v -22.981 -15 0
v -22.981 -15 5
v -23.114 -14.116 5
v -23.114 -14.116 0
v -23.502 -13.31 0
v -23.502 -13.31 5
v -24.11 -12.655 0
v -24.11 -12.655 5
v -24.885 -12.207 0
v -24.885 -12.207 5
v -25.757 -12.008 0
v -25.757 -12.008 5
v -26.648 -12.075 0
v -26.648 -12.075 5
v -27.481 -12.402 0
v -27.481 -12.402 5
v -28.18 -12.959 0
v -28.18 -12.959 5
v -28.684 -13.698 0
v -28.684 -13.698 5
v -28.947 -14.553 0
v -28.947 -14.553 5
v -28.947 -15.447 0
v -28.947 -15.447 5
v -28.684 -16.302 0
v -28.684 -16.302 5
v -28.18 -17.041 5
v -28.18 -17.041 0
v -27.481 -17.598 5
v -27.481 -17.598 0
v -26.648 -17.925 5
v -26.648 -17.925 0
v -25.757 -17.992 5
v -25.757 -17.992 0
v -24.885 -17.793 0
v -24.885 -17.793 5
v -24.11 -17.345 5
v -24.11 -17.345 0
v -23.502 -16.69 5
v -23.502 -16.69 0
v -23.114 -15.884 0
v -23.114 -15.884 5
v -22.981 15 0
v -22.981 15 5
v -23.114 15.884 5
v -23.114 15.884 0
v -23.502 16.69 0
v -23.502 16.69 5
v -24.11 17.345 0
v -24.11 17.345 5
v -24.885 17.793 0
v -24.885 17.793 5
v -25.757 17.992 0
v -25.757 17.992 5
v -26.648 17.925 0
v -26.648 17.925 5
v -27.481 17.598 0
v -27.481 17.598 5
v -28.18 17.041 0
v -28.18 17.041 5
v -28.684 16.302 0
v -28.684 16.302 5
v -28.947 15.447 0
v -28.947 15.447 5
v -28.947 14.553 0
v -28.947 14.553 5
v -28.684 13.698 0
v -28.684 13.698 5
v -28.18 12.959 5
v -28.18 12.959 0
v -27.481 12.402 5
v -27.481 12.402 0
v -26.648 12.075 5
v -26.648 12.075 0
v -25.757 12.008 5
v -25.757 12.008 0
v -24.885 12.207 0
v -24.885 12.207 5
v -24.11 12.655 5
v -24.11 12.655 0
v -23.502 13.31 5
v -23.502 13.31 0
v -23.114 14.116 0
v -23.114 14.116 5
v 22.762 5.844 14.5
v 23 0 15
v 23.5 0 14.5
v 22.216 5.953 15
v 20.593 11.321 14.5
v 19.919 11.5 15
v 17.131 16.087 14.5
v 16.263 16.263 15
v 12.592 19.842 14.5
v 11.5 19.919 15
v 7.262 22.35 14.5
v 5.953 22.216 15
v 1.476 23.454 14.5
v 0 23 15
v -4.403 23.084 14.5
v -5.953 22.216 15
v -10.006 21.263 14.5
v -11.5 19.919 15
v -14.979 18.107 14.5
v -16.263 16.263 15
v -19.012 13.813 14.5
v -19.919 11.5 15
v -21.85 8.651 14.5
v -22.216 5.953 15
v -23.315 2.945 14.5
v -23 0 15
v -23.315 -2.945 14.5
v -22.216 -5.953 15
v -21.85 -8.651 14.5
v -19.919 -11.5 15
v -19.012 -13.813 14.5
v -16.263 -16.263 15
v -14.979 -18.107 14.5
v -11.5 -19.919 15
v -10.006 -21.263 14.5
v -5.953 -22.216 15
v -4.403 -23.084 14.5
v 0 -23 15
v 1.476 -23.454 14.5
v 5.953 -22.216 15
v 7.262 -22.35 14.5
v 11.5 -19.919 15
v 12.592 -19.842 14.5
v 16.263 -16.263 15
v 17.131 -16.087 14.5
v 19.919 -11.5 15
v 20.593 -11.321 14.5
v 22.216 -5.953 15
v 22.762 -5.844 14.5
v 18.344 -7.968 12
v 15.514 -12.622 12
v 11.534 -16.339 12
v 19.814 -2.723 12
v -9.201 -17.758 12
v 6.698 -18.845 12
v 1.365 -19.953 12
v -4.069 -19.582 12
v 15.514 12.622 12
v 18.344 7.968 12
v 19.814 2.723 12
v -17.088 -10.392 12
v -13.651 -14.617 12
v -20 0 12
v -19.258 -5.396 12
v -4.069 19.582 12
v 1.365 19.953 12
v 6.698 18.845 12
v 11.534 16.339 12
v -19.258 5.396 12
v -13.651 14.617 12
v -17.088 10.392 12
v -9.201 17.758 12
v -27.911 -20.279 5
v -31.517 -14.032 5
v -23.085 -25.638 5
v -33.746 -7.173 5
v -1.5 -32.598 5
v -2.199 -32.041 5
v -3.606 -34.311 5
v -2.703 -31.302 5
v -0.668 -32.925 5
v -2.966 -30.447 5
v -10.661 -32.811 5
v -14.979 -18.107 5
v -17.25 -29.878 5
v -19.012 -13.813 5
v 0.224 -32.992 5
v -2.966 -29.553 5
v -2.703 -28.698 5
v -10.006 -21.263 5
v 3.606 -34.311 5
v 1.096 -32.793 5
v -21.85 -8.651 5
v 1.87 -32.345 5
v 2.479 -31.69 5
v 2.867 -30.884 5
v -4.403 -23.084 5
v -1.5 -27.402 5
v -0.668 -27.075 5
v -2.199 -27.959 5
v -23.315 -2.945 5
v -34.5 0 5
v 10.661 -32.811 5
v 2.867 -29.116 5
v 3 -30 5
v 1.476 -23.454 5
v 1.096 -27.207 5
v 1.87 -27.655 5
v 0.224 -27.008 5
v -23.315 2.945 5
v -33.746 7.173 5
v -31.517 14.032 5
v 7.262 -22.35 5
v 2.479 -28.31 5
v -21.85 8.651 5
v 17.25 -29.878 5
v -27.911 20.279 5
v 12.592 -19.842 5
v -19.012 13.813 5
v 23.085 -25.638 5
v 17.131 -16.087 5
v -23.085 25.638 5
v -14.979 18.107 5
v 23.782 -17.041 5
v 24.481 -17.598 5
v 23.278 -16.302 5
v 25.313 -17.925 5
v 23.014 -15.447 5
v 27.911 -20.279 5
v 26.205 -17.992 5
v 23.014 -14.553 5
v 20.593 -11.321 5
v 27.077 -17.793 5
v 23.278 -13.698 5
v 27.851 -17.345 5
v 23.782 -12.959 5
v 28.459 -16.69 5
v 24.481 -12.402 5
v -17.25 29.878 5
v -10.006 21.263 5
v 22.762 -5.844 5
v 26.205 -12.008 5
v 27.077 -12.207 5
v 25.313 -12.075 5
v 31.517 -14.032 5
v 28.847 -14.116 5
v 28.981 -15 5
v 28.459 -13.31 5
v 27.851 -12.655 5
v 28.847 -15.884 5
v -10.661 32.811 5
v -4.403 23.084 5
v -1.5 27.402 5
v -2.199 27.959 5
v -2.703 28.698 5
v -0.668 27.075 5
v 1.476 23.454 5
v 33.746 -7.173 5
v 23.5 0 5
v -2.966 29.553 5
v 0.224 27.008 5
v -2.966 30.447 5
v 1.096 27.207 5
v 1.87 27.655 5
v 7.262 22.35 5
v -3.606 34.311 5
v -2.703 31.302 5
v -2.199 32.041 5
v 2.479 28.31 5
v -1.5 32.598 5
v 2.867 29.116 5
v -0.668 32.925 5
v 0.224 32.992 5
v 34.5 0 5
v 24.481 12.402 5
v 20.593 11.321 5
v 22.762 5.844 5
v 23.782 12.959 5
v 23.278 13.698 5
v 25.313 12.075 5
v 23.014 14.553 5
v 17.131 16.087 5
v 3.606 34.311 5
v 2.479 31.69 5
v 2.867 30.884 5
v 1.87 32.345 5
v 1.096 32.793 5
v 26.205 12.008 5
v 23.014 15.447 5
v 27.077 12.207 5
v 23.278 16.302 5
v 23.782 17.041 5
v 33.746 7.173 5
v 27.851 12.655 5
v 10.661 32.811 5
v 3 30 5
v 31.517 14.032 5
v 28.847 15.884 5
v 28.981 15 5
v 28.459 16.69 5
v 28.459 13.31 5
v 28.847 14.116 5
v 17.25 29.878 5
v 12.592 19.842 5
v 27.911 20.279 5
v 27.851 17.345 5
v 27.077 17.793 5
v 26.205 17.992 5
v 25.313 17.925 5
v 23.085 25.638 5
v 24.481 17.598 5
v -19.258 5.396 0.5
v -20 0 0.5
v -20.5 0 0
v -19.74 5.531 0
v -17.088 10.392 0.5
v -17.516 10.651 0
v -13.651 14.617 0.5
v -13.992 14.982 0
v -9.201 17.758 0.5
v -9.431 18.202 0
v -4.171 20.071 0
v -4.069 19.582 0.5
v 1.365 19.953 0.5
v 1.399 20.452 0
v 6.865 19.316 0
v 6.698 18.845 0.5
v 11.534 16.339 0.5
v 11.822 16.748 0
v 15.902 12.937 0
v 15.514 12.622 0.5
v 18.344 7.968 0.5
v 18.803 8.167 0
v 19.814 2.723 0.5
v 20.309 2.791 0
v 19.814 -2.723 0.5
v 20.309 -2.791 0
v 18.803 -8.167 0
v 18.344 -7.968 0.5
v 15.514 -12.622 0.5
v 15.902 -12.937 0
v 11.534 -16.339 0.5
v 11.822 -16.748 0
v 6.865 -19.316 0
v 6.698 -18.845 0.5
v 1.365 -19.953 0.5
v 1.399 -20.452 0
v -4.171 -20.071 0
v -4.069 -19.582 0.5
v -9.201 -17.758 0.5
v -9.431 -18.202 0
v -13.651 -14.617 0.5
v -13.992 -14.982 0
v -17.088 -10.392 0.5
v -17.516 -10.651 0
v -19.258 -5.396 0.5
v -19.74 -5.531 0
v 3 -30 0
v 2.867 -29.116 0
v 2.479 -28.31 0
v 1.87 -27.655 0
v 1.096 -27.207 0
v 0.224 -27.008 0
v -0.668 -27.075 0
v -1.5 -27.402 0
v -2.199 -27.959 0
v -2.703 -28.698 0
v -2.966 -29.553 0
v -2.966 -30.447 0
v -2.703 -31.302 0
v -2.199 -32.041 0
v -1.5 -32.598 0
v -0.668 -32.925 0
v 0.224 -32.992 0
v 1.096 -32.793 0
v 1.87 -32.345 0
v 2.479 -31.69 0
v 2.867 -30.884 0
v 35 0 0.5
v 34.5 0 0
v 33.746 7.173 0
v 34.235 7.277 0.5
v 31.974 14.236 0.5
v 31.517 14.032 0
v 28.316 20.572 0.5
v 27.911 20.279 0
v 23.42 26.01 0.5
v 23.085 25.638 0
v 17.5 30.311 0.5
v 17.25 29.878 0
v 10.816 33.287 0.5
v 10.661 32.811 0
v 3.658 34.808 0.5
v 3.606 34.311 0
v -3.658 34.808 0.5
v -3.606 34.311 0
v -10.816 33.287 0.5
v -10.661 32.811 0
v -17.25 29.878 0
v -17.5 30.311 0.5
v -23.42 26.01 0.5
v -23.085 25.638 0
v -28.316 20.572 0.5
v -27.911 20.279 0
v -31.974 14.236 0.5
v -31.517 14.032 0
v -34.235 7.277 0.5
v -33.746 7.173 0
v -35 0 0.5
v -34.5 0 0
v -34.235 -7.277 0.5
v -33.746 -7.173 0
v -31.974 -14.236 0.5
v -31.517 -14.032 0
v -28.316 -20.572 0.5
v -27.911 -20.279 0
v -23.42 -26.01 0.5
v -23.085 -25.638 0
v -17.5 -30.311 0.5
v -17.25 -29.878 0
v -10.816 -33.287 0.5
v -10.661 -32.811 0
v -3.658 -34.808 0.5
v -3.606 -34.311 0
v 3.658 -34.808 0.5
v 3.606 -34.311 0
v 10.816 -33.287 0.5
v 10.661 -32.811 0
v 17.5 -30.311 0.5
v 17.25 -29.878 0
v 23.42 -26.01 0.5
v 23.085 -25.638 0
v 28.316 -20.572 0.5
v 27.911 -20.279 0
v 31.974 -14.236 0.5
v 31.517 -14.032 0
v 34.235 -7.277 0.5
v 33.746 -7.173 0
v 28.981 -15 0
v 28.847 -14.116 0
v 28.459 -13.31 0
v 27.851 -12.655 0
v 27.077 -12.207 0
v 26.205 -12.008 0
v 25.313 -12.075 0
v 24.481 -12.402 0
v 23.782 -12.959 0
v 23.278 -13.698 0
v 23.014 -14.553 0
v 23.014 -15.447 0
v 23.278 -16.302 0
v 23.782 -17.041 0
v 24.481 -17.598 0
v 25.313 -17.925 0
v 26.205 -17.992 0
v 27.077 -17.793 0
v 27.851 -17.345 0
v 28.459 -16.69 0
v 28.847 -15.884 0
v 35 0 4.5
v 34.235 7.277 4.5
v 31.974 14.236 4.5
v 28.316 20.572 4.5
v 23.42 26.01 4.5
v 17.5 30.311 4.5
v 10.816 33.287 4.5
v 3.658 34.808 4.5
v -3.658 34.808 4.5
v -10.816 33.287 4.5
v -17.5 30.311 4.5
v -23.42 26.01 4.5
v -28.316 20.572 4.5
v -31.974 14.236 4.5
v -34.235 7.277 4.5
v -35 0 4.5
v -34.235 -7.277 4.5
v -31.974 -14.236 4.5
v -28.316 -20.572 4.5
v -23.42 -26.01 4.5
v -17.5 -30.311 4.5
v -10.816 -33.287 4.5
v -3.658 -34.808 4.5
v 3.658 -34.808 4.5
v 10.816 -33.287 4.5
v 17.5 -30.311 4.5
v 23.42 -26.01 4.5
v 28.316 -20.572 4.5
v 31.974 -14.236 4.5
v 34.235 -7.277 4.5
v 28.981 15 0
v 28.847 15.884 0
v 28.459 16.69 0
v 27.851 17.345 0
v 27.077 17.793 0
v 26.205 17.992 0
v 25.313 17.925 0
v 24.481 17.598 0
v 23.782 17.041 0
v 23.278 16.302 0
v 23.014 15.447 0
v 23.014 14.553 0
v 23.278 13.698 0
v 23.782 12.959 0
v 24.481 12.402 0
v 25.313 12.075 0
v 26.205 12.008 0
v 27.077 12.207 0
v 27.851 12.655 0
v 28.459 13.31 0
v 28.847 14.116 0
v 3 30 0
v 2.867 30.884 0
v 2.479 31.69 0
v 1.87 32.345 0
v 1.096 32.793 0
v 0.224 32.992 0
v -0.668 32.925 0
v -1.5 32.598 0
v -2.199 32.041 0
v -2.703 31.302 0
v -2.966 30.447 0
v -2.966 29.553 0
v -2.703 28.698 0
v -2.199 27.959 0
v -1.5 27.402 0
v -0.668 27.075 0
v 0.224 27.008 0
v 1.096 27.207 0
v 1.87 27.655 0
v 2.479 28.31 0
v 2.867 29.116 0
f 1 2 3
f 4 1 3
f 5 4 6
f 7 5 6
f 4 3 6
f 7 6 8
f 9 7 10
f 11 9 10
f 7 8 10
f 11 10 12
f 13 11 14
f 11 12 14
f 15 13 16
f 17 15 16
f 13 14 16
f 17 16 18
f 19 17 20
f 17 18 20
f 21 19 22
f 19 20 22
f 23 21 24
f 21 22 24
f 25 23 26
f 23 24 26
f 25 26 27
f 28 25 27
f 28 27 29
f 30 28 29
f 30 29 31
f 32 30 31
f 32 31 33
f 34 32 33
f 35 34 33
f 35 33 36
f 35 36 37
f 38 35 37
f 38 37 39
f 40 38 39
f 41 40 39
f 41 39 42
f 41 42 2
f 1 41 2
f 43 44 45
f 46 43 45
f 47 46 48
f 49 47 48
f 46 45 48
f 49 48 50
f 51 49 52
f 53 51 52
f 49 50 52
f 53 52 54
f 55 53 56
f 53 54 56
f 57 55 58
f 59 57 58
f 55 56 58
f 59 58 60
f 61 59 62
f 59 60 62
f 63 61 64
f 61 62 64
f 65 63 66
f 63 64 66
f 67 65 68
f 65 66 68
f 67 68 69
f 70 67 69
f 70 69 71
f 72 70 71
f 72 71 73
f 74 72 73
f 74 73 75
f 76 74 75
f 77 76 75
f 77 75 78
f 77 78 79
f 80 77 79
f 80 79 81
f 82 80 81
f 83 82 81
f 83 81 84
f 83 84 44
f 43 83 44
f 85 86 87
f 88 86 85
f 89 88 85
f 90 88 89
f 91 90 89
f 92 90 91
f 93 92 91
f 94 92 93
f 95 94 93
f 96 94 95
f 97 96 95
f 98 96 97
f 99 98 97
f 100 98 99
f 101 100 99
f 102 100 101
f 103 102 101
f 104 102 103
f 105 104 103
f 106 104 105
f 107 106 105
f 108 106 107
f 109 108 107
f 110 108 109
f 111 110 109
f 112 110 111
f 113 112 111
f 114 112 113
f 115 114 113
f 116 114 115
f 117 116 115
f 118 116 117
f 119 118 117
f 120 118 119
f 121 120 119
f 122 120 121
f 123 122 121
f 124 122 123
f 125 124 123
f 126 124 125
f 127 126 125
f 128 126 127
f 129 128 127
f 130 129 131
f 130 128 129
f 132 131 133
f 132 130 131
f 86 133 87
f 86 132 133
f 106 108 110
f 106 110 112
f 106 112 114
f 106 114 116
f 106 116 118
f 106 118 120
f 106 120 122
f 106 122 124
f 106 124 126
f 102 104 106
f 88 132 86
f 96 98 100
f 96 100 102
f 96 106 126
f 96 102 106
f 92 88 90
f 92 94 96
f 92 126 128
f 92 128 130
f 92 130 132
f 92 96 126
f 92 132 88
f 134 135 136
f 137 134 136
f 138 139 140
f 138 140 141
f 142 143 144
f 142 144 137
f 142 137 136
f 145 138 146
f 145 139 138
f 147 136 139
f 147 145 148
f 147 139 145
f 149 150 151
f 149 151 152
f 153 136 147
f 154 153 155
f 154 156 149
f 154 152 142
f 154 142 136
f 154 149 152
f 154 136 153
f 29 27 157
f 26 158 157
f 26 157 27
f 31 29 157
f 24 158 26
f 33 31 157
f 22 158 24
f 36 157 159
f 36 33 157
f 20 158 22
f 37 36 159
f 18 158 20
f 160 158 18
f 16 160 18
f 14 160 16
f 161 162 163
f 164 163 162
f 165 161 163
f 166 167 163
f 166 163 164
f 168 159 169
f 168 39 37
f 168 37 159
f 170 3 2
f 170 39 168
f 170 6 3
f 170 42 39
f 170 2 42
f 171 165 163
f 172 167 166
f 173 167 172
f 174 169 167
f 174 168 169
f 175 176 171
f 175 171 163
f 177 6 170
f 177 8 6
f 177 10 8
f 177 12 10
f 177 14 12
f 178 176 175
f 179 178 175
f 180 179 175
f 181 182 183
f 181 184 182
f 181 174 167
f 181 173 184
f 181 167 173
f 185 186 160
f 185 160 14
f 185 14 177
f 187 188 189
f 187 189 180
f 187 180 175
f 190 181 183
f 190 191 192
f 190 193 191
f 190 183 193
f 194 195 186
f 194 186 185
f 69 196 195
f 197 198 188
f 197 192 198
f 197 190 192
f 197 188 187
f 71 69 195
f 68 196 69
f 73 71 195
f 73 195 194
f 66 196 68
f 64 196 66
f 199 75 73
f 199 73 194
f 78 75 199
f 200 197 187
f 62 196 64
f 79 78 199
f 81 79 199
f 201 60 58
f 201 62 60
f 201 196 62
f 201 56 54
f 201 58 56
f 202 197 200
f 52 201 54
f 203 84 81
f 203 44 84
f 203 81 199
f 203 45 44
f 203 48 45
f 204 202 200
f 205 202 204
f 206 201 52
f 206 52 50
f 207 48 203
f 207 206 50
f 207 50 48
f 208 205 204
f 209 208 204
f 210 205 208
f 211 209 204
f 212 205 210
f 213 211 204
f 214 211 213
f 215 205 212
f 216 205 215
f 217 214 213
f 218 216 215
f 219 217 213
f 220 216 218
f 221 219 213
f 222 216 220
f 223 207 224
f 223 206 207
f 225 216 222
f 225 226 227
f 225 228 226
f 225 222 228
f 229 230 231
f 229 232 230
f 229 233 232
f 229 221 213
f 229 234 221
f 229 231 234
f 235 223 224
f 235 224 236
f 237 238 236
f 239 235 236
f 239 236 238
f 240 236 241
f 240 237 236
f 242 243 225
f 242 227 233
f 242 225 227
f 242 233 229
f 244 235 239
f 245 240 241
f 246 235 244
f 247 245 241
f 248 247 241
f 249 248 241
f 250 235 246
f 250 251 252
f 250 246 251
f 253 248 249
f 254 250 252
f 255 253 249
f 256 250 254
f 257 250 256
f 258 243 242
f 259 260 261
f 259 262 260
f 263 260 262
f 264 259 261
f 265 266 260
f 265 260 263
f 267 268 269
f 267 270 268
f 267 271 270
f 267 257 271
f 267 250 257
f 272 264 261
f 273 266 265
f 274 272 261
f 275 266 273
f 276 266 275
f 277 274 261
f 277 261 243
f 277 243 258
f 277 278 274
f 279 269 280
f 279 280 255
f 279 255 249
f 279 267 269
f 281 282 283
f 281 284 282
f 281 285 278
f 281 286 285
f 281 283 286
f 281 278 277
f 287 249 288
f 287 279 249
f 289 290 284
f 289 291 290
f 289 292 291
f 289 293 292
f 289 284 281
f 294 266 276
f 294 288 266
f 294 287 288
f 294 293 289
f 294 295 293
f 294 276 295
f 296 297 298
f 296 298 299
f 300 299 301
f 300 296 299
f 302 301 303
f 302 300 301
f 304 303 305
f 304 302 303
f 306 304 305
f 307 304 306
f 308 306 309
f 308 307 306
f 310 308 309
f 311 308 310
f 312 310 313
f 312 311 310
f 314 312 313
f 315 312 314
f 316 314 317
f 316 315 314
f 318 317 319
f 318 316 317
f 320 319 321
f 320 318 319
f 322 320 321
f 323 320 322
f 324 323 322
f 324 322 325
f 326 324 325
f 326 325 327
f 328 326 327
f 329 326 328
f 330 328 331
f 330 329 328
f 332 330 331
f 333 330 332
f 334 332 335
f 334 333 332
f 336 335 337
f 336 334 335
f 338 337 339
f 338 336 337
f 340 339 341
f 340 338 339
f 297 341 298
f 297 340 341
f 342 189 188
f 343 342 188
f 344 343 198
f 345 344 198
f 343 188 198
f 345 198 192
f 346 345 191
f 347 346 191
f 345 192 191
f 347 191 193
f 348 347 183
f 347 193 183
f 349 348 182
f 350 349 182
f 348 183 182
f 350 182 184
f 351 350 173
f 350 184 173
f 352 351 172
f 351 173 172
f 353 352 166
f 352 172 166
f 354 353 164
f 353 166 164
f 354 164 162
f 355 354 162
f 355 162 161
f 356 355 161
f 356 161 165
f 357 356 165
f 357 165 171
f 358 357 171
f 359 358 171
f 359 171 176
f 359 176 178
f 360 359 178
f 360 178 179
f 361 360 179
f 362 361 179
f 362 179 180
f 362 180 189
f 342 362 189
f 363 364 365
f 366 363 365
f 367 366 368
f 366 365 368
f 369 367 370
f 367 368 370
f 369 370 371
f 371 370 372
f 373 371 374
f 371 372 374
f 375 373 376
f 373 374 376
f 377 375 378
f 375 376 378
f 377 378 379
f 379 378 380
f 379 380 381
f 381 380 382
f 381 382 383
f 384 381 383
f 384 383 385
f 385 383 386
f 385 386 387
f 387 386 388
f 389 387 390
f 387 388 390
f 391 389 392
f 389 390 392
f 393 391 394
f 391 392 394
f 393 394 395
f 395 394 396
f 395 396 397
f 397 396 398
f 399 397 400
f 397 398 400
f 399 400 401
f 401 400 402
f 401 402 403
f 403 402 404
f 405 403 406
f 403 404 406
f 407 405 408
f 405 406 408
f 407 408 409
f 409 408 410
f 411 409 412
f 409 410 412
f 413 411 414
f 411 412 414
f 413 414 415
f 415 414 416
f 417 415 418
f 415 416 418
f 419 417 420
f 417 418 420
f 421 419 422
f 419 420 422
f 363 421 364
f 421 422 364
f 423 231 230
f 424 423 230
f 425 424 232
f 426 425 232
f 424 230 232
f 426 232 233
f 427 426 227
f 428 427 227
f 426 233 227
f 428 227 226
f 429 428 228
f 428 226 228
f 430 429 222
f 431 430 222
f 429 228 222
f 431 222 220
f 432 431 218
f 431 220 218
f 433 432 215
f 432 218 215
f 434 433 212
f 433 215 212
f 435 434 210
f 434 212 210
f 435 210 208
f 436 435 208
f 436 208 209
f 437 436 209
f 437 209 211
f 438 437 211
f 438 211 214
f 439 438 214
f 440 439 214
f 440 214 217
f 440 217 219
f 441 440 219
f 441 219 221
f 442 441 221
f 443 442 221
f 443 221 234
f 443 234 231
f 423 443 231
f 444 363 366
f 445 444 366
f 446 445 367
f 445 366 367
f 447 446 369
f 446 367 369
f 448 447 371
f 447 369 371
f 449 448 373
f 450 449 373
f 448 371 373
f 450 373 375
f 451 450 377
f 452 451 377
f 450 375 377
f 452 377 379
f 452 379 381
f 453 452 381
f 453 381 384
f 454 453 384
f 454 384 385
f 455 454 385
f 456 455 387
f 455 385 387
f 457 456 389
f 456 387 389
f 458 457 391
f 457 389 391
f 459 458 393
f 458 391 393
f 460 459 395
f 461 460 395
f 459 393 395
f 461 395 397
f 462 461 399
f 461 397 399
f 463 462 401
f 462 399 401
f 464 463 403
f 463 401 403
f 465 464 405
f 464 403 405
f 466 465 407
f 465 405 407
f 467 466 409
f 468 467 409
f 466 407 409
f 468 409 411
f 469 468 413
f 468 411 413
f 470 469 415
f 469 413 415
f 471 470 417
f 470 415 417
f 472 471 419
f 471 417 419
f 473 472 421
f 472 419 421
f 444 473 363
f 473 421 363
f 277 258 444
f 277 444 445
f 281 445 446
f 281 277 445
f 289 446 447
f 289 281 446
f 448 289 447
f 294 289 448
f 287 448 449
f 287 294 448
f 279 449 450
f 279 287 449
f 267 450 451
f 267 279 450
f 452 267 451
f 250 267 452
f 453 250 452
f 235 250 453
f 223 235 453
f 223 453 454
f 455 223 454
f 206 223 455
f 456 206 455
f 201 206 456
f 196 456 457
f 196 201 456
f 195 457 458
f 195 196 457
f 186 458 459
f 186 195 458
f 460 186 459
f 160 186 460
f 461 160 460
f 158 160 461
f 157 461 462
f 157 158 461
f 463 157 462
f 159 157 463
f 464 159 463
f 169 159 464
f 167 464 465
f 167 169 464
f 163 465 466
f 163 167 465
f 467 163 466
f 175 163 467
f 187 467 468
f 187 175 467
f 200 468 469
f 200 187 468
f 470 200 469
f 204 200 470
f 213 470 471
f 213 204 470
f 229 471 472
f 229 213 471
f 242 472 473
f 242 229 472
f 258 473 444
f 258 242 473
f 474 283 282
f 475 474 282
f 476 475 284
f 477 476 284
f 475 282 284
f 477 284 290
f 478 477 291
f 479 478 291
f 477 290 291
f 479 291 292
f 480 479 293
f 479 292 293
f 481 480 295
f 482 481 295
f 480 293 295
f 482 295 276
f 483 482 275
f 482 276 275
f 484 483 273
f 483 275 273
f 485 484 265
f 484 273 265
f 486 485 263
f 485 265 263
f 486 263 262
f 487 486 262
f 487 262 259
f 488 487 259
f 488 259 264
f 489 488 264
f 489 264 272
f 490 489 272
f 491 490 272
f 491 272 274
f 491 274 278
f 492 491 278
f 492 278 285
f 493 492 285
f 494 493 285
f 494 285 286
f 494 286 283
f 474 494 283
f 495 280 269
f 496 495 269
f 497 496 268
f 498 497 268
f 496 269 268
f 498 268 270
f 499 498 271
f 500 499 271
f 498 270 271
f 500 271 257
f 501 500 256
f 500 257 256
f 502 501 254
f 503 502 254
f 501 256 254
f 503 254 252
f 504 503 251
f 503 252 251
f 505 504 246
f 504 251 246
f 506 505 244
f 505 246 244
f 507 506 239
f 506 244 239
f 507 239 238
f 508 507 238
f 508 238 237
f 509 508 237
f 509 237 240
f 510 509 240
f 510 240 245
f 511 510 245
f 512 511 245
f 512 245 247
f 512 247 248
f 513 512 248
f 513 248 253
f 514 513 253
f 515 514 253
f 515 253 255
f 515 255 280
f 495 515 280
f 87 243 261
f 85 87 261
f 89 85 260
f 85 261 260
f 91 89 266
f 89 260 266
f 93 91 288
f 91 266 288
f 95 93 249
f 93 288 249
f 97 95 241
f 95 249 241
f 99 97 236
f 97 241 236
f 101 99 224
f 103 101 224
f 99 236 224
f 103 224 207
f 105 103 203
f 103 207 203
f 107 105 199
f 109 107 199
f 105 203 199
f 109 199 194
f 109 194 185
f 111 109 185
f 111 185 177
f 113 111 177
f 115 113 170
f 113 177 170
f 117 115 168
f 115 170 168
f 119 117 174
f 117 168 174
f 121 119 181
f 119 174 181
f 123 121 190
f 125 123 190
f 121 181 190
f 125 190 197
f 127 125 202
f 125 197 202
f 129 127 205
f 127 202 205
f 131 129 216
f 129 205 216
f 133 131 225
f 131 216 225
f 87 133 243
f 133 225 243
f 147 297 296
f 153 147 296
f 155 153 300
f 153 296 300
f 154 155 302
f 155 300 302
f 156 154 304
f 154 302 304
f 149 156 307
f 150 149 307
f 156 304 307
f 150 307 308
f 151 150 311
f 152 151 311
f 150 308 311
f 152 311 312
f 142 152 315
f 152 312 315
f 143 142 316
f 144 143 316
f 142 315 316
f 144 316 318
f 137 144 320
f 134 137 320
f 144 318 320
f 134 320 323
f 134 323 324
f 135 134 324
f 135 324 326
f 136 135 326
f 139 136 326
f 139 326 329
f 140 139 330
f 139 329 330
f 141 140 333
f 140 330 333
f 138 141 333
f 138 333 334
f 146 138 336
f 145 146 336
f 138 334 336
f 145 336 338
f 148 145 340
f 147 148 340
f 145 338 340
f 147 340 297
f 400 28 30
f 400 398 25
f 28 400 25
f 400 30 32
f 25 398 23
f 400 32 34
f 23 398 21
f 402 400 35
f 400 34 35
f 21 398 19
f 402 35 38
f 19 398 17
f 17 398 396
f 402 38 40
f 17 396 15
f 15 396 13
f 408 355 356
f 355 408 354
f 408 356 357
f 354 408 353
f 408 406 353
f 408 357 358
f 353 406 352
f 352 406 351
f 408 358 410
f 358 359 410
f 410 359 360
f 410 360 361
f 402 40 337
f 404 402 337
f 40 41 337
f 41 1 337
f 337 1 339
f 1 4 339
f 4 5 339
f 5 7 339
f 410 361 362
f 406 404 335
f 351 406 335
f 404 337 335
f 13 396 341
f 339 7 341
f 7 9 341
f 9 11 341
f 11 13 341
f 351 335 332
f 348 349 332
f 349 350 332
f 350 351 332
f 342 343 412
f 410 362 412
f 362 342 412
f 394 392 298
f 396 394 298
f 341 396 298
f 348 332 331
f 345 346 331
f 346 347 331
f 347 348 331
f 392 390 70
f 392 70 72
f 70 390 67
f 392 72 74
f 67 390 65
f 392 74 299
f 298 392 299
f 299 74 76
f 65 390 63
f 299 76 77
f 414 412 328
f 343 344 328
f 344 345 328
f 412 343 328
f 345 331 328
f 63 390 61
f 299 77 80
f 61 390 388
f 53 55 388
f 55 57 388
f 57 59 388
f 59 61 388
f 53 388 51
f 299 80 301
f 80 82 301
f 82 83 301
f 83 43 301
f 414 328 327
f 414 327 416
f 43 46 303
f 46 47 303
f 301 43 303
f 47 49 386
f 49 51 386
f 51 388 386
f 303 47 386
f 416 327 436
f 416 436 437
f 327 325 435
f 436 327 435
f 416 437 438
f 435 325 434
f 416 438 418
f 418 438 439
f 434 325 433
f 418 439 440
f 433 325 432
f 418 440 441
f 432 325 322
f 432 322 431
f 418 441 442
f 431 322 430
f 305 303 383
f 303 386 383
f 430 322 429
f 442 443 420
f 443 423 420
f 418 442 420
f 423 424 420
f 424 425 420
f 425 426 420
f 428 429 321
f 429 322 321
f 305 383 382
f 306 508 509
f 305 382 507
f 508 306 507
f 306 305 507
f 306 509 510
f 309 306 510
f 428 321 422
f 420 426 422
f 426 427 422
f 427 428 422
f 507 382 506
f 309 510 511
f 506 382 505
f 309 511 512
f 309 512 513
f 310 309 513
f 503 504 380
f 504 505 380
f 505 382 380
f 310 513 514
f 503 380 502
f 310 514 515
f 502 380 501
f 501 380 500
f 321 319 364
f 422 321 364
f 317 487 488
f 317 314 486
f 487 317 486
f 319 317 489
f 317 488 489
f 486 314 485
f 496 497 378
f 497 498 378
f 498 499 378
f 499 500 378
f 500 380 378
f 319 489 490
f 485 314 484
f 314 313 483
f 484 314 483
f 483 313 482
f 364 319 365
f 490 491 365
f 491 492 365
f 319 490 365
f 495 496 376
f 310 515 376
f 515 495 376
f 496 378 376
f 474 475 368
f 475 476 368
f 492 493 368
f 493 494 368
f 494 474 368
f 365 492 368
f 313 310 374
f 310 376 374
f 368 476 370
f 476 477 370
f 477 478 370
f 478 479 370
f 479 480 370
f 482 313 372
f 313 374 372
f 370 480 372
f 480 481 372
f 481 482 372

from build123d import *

# Parameters (mm, degrees)
SKETCH_1_R          = 35
EXTRUDE_1_DEPTH     = 5
SKETCH_2_R          = 23.5
EXTRUDE_2_DEPTH     = 10
SKETCH_3_R          = 20
CUT_EXTRUDE_1_DEPTH = 12
SKETCH_4_R          = 3
CUT_EXTRUDE_2_DEPTH = 12
CHAMFER_1_SIZE      = 0.5


with BuildPart() as part:
    # 草图1 → 拉伸1 (new body)
    with BuildSketch(Plane.XY):
        Circle(SKETCH_1_R)
    extrude(amount=EXTRUDE_1_DEPTH)

    # 草图2 → 拉伸2 (add)
    with BuildSketch(Plane.XY.offset(5)):
        Circle(SKETCH_2_R)
    extrude(amount=EXTRUDE_2_DEPTH)

    # 草图3 → 切除-拉伸1 (cut)
    with BuildSketch(Plane(origin=(0, 0, 0), x_dir=(-1, 0, 0), z_dir=(0, 0, -1))):
        Circle(SKETCH_3_R)
    extrude(amount=-CUT_EXTRUDE_1_DEPTH, mode=Mode.SUBTRACT)

    # 草图4 → 切除-拉伸2 (cut)
    with BuildSketch(Plane.XY.offset(5)):
        with Locations((25.980762114, 15)):
            Circle(SKETCH_4_R)
        with Locations((0, 30)):
            Circle(SKETCH_4_R)
        with Locations((25.980762114, -15)):
            Circle(SKETCH_4_R)
        with Locations((0, -30)):
            Circle(SKETCH_4_R)
        with Locations((-25.980762114, -15)):
            Circle(SKETCH_4_R)
        with Locations((-25.980762114, 15)):
            Circle(SKETCH_4_R)
    extrude(amount=-CUT_EXTRUDE_2_DEPTH, mode=Mode.SUBTRACT)

    # 倒角1
    chamfer_1_edges = [part.edges().sort_by_distance(p)[0] for p in [
        (20, 0, 0),
        (-35, 0, 0),
        (-35, 0, 5),
        (-23.5, 0, 15),
    ]]
    chamfer(chamfer_1_edges, length=CHAMFER_1_SIZE)


solid = part.part
